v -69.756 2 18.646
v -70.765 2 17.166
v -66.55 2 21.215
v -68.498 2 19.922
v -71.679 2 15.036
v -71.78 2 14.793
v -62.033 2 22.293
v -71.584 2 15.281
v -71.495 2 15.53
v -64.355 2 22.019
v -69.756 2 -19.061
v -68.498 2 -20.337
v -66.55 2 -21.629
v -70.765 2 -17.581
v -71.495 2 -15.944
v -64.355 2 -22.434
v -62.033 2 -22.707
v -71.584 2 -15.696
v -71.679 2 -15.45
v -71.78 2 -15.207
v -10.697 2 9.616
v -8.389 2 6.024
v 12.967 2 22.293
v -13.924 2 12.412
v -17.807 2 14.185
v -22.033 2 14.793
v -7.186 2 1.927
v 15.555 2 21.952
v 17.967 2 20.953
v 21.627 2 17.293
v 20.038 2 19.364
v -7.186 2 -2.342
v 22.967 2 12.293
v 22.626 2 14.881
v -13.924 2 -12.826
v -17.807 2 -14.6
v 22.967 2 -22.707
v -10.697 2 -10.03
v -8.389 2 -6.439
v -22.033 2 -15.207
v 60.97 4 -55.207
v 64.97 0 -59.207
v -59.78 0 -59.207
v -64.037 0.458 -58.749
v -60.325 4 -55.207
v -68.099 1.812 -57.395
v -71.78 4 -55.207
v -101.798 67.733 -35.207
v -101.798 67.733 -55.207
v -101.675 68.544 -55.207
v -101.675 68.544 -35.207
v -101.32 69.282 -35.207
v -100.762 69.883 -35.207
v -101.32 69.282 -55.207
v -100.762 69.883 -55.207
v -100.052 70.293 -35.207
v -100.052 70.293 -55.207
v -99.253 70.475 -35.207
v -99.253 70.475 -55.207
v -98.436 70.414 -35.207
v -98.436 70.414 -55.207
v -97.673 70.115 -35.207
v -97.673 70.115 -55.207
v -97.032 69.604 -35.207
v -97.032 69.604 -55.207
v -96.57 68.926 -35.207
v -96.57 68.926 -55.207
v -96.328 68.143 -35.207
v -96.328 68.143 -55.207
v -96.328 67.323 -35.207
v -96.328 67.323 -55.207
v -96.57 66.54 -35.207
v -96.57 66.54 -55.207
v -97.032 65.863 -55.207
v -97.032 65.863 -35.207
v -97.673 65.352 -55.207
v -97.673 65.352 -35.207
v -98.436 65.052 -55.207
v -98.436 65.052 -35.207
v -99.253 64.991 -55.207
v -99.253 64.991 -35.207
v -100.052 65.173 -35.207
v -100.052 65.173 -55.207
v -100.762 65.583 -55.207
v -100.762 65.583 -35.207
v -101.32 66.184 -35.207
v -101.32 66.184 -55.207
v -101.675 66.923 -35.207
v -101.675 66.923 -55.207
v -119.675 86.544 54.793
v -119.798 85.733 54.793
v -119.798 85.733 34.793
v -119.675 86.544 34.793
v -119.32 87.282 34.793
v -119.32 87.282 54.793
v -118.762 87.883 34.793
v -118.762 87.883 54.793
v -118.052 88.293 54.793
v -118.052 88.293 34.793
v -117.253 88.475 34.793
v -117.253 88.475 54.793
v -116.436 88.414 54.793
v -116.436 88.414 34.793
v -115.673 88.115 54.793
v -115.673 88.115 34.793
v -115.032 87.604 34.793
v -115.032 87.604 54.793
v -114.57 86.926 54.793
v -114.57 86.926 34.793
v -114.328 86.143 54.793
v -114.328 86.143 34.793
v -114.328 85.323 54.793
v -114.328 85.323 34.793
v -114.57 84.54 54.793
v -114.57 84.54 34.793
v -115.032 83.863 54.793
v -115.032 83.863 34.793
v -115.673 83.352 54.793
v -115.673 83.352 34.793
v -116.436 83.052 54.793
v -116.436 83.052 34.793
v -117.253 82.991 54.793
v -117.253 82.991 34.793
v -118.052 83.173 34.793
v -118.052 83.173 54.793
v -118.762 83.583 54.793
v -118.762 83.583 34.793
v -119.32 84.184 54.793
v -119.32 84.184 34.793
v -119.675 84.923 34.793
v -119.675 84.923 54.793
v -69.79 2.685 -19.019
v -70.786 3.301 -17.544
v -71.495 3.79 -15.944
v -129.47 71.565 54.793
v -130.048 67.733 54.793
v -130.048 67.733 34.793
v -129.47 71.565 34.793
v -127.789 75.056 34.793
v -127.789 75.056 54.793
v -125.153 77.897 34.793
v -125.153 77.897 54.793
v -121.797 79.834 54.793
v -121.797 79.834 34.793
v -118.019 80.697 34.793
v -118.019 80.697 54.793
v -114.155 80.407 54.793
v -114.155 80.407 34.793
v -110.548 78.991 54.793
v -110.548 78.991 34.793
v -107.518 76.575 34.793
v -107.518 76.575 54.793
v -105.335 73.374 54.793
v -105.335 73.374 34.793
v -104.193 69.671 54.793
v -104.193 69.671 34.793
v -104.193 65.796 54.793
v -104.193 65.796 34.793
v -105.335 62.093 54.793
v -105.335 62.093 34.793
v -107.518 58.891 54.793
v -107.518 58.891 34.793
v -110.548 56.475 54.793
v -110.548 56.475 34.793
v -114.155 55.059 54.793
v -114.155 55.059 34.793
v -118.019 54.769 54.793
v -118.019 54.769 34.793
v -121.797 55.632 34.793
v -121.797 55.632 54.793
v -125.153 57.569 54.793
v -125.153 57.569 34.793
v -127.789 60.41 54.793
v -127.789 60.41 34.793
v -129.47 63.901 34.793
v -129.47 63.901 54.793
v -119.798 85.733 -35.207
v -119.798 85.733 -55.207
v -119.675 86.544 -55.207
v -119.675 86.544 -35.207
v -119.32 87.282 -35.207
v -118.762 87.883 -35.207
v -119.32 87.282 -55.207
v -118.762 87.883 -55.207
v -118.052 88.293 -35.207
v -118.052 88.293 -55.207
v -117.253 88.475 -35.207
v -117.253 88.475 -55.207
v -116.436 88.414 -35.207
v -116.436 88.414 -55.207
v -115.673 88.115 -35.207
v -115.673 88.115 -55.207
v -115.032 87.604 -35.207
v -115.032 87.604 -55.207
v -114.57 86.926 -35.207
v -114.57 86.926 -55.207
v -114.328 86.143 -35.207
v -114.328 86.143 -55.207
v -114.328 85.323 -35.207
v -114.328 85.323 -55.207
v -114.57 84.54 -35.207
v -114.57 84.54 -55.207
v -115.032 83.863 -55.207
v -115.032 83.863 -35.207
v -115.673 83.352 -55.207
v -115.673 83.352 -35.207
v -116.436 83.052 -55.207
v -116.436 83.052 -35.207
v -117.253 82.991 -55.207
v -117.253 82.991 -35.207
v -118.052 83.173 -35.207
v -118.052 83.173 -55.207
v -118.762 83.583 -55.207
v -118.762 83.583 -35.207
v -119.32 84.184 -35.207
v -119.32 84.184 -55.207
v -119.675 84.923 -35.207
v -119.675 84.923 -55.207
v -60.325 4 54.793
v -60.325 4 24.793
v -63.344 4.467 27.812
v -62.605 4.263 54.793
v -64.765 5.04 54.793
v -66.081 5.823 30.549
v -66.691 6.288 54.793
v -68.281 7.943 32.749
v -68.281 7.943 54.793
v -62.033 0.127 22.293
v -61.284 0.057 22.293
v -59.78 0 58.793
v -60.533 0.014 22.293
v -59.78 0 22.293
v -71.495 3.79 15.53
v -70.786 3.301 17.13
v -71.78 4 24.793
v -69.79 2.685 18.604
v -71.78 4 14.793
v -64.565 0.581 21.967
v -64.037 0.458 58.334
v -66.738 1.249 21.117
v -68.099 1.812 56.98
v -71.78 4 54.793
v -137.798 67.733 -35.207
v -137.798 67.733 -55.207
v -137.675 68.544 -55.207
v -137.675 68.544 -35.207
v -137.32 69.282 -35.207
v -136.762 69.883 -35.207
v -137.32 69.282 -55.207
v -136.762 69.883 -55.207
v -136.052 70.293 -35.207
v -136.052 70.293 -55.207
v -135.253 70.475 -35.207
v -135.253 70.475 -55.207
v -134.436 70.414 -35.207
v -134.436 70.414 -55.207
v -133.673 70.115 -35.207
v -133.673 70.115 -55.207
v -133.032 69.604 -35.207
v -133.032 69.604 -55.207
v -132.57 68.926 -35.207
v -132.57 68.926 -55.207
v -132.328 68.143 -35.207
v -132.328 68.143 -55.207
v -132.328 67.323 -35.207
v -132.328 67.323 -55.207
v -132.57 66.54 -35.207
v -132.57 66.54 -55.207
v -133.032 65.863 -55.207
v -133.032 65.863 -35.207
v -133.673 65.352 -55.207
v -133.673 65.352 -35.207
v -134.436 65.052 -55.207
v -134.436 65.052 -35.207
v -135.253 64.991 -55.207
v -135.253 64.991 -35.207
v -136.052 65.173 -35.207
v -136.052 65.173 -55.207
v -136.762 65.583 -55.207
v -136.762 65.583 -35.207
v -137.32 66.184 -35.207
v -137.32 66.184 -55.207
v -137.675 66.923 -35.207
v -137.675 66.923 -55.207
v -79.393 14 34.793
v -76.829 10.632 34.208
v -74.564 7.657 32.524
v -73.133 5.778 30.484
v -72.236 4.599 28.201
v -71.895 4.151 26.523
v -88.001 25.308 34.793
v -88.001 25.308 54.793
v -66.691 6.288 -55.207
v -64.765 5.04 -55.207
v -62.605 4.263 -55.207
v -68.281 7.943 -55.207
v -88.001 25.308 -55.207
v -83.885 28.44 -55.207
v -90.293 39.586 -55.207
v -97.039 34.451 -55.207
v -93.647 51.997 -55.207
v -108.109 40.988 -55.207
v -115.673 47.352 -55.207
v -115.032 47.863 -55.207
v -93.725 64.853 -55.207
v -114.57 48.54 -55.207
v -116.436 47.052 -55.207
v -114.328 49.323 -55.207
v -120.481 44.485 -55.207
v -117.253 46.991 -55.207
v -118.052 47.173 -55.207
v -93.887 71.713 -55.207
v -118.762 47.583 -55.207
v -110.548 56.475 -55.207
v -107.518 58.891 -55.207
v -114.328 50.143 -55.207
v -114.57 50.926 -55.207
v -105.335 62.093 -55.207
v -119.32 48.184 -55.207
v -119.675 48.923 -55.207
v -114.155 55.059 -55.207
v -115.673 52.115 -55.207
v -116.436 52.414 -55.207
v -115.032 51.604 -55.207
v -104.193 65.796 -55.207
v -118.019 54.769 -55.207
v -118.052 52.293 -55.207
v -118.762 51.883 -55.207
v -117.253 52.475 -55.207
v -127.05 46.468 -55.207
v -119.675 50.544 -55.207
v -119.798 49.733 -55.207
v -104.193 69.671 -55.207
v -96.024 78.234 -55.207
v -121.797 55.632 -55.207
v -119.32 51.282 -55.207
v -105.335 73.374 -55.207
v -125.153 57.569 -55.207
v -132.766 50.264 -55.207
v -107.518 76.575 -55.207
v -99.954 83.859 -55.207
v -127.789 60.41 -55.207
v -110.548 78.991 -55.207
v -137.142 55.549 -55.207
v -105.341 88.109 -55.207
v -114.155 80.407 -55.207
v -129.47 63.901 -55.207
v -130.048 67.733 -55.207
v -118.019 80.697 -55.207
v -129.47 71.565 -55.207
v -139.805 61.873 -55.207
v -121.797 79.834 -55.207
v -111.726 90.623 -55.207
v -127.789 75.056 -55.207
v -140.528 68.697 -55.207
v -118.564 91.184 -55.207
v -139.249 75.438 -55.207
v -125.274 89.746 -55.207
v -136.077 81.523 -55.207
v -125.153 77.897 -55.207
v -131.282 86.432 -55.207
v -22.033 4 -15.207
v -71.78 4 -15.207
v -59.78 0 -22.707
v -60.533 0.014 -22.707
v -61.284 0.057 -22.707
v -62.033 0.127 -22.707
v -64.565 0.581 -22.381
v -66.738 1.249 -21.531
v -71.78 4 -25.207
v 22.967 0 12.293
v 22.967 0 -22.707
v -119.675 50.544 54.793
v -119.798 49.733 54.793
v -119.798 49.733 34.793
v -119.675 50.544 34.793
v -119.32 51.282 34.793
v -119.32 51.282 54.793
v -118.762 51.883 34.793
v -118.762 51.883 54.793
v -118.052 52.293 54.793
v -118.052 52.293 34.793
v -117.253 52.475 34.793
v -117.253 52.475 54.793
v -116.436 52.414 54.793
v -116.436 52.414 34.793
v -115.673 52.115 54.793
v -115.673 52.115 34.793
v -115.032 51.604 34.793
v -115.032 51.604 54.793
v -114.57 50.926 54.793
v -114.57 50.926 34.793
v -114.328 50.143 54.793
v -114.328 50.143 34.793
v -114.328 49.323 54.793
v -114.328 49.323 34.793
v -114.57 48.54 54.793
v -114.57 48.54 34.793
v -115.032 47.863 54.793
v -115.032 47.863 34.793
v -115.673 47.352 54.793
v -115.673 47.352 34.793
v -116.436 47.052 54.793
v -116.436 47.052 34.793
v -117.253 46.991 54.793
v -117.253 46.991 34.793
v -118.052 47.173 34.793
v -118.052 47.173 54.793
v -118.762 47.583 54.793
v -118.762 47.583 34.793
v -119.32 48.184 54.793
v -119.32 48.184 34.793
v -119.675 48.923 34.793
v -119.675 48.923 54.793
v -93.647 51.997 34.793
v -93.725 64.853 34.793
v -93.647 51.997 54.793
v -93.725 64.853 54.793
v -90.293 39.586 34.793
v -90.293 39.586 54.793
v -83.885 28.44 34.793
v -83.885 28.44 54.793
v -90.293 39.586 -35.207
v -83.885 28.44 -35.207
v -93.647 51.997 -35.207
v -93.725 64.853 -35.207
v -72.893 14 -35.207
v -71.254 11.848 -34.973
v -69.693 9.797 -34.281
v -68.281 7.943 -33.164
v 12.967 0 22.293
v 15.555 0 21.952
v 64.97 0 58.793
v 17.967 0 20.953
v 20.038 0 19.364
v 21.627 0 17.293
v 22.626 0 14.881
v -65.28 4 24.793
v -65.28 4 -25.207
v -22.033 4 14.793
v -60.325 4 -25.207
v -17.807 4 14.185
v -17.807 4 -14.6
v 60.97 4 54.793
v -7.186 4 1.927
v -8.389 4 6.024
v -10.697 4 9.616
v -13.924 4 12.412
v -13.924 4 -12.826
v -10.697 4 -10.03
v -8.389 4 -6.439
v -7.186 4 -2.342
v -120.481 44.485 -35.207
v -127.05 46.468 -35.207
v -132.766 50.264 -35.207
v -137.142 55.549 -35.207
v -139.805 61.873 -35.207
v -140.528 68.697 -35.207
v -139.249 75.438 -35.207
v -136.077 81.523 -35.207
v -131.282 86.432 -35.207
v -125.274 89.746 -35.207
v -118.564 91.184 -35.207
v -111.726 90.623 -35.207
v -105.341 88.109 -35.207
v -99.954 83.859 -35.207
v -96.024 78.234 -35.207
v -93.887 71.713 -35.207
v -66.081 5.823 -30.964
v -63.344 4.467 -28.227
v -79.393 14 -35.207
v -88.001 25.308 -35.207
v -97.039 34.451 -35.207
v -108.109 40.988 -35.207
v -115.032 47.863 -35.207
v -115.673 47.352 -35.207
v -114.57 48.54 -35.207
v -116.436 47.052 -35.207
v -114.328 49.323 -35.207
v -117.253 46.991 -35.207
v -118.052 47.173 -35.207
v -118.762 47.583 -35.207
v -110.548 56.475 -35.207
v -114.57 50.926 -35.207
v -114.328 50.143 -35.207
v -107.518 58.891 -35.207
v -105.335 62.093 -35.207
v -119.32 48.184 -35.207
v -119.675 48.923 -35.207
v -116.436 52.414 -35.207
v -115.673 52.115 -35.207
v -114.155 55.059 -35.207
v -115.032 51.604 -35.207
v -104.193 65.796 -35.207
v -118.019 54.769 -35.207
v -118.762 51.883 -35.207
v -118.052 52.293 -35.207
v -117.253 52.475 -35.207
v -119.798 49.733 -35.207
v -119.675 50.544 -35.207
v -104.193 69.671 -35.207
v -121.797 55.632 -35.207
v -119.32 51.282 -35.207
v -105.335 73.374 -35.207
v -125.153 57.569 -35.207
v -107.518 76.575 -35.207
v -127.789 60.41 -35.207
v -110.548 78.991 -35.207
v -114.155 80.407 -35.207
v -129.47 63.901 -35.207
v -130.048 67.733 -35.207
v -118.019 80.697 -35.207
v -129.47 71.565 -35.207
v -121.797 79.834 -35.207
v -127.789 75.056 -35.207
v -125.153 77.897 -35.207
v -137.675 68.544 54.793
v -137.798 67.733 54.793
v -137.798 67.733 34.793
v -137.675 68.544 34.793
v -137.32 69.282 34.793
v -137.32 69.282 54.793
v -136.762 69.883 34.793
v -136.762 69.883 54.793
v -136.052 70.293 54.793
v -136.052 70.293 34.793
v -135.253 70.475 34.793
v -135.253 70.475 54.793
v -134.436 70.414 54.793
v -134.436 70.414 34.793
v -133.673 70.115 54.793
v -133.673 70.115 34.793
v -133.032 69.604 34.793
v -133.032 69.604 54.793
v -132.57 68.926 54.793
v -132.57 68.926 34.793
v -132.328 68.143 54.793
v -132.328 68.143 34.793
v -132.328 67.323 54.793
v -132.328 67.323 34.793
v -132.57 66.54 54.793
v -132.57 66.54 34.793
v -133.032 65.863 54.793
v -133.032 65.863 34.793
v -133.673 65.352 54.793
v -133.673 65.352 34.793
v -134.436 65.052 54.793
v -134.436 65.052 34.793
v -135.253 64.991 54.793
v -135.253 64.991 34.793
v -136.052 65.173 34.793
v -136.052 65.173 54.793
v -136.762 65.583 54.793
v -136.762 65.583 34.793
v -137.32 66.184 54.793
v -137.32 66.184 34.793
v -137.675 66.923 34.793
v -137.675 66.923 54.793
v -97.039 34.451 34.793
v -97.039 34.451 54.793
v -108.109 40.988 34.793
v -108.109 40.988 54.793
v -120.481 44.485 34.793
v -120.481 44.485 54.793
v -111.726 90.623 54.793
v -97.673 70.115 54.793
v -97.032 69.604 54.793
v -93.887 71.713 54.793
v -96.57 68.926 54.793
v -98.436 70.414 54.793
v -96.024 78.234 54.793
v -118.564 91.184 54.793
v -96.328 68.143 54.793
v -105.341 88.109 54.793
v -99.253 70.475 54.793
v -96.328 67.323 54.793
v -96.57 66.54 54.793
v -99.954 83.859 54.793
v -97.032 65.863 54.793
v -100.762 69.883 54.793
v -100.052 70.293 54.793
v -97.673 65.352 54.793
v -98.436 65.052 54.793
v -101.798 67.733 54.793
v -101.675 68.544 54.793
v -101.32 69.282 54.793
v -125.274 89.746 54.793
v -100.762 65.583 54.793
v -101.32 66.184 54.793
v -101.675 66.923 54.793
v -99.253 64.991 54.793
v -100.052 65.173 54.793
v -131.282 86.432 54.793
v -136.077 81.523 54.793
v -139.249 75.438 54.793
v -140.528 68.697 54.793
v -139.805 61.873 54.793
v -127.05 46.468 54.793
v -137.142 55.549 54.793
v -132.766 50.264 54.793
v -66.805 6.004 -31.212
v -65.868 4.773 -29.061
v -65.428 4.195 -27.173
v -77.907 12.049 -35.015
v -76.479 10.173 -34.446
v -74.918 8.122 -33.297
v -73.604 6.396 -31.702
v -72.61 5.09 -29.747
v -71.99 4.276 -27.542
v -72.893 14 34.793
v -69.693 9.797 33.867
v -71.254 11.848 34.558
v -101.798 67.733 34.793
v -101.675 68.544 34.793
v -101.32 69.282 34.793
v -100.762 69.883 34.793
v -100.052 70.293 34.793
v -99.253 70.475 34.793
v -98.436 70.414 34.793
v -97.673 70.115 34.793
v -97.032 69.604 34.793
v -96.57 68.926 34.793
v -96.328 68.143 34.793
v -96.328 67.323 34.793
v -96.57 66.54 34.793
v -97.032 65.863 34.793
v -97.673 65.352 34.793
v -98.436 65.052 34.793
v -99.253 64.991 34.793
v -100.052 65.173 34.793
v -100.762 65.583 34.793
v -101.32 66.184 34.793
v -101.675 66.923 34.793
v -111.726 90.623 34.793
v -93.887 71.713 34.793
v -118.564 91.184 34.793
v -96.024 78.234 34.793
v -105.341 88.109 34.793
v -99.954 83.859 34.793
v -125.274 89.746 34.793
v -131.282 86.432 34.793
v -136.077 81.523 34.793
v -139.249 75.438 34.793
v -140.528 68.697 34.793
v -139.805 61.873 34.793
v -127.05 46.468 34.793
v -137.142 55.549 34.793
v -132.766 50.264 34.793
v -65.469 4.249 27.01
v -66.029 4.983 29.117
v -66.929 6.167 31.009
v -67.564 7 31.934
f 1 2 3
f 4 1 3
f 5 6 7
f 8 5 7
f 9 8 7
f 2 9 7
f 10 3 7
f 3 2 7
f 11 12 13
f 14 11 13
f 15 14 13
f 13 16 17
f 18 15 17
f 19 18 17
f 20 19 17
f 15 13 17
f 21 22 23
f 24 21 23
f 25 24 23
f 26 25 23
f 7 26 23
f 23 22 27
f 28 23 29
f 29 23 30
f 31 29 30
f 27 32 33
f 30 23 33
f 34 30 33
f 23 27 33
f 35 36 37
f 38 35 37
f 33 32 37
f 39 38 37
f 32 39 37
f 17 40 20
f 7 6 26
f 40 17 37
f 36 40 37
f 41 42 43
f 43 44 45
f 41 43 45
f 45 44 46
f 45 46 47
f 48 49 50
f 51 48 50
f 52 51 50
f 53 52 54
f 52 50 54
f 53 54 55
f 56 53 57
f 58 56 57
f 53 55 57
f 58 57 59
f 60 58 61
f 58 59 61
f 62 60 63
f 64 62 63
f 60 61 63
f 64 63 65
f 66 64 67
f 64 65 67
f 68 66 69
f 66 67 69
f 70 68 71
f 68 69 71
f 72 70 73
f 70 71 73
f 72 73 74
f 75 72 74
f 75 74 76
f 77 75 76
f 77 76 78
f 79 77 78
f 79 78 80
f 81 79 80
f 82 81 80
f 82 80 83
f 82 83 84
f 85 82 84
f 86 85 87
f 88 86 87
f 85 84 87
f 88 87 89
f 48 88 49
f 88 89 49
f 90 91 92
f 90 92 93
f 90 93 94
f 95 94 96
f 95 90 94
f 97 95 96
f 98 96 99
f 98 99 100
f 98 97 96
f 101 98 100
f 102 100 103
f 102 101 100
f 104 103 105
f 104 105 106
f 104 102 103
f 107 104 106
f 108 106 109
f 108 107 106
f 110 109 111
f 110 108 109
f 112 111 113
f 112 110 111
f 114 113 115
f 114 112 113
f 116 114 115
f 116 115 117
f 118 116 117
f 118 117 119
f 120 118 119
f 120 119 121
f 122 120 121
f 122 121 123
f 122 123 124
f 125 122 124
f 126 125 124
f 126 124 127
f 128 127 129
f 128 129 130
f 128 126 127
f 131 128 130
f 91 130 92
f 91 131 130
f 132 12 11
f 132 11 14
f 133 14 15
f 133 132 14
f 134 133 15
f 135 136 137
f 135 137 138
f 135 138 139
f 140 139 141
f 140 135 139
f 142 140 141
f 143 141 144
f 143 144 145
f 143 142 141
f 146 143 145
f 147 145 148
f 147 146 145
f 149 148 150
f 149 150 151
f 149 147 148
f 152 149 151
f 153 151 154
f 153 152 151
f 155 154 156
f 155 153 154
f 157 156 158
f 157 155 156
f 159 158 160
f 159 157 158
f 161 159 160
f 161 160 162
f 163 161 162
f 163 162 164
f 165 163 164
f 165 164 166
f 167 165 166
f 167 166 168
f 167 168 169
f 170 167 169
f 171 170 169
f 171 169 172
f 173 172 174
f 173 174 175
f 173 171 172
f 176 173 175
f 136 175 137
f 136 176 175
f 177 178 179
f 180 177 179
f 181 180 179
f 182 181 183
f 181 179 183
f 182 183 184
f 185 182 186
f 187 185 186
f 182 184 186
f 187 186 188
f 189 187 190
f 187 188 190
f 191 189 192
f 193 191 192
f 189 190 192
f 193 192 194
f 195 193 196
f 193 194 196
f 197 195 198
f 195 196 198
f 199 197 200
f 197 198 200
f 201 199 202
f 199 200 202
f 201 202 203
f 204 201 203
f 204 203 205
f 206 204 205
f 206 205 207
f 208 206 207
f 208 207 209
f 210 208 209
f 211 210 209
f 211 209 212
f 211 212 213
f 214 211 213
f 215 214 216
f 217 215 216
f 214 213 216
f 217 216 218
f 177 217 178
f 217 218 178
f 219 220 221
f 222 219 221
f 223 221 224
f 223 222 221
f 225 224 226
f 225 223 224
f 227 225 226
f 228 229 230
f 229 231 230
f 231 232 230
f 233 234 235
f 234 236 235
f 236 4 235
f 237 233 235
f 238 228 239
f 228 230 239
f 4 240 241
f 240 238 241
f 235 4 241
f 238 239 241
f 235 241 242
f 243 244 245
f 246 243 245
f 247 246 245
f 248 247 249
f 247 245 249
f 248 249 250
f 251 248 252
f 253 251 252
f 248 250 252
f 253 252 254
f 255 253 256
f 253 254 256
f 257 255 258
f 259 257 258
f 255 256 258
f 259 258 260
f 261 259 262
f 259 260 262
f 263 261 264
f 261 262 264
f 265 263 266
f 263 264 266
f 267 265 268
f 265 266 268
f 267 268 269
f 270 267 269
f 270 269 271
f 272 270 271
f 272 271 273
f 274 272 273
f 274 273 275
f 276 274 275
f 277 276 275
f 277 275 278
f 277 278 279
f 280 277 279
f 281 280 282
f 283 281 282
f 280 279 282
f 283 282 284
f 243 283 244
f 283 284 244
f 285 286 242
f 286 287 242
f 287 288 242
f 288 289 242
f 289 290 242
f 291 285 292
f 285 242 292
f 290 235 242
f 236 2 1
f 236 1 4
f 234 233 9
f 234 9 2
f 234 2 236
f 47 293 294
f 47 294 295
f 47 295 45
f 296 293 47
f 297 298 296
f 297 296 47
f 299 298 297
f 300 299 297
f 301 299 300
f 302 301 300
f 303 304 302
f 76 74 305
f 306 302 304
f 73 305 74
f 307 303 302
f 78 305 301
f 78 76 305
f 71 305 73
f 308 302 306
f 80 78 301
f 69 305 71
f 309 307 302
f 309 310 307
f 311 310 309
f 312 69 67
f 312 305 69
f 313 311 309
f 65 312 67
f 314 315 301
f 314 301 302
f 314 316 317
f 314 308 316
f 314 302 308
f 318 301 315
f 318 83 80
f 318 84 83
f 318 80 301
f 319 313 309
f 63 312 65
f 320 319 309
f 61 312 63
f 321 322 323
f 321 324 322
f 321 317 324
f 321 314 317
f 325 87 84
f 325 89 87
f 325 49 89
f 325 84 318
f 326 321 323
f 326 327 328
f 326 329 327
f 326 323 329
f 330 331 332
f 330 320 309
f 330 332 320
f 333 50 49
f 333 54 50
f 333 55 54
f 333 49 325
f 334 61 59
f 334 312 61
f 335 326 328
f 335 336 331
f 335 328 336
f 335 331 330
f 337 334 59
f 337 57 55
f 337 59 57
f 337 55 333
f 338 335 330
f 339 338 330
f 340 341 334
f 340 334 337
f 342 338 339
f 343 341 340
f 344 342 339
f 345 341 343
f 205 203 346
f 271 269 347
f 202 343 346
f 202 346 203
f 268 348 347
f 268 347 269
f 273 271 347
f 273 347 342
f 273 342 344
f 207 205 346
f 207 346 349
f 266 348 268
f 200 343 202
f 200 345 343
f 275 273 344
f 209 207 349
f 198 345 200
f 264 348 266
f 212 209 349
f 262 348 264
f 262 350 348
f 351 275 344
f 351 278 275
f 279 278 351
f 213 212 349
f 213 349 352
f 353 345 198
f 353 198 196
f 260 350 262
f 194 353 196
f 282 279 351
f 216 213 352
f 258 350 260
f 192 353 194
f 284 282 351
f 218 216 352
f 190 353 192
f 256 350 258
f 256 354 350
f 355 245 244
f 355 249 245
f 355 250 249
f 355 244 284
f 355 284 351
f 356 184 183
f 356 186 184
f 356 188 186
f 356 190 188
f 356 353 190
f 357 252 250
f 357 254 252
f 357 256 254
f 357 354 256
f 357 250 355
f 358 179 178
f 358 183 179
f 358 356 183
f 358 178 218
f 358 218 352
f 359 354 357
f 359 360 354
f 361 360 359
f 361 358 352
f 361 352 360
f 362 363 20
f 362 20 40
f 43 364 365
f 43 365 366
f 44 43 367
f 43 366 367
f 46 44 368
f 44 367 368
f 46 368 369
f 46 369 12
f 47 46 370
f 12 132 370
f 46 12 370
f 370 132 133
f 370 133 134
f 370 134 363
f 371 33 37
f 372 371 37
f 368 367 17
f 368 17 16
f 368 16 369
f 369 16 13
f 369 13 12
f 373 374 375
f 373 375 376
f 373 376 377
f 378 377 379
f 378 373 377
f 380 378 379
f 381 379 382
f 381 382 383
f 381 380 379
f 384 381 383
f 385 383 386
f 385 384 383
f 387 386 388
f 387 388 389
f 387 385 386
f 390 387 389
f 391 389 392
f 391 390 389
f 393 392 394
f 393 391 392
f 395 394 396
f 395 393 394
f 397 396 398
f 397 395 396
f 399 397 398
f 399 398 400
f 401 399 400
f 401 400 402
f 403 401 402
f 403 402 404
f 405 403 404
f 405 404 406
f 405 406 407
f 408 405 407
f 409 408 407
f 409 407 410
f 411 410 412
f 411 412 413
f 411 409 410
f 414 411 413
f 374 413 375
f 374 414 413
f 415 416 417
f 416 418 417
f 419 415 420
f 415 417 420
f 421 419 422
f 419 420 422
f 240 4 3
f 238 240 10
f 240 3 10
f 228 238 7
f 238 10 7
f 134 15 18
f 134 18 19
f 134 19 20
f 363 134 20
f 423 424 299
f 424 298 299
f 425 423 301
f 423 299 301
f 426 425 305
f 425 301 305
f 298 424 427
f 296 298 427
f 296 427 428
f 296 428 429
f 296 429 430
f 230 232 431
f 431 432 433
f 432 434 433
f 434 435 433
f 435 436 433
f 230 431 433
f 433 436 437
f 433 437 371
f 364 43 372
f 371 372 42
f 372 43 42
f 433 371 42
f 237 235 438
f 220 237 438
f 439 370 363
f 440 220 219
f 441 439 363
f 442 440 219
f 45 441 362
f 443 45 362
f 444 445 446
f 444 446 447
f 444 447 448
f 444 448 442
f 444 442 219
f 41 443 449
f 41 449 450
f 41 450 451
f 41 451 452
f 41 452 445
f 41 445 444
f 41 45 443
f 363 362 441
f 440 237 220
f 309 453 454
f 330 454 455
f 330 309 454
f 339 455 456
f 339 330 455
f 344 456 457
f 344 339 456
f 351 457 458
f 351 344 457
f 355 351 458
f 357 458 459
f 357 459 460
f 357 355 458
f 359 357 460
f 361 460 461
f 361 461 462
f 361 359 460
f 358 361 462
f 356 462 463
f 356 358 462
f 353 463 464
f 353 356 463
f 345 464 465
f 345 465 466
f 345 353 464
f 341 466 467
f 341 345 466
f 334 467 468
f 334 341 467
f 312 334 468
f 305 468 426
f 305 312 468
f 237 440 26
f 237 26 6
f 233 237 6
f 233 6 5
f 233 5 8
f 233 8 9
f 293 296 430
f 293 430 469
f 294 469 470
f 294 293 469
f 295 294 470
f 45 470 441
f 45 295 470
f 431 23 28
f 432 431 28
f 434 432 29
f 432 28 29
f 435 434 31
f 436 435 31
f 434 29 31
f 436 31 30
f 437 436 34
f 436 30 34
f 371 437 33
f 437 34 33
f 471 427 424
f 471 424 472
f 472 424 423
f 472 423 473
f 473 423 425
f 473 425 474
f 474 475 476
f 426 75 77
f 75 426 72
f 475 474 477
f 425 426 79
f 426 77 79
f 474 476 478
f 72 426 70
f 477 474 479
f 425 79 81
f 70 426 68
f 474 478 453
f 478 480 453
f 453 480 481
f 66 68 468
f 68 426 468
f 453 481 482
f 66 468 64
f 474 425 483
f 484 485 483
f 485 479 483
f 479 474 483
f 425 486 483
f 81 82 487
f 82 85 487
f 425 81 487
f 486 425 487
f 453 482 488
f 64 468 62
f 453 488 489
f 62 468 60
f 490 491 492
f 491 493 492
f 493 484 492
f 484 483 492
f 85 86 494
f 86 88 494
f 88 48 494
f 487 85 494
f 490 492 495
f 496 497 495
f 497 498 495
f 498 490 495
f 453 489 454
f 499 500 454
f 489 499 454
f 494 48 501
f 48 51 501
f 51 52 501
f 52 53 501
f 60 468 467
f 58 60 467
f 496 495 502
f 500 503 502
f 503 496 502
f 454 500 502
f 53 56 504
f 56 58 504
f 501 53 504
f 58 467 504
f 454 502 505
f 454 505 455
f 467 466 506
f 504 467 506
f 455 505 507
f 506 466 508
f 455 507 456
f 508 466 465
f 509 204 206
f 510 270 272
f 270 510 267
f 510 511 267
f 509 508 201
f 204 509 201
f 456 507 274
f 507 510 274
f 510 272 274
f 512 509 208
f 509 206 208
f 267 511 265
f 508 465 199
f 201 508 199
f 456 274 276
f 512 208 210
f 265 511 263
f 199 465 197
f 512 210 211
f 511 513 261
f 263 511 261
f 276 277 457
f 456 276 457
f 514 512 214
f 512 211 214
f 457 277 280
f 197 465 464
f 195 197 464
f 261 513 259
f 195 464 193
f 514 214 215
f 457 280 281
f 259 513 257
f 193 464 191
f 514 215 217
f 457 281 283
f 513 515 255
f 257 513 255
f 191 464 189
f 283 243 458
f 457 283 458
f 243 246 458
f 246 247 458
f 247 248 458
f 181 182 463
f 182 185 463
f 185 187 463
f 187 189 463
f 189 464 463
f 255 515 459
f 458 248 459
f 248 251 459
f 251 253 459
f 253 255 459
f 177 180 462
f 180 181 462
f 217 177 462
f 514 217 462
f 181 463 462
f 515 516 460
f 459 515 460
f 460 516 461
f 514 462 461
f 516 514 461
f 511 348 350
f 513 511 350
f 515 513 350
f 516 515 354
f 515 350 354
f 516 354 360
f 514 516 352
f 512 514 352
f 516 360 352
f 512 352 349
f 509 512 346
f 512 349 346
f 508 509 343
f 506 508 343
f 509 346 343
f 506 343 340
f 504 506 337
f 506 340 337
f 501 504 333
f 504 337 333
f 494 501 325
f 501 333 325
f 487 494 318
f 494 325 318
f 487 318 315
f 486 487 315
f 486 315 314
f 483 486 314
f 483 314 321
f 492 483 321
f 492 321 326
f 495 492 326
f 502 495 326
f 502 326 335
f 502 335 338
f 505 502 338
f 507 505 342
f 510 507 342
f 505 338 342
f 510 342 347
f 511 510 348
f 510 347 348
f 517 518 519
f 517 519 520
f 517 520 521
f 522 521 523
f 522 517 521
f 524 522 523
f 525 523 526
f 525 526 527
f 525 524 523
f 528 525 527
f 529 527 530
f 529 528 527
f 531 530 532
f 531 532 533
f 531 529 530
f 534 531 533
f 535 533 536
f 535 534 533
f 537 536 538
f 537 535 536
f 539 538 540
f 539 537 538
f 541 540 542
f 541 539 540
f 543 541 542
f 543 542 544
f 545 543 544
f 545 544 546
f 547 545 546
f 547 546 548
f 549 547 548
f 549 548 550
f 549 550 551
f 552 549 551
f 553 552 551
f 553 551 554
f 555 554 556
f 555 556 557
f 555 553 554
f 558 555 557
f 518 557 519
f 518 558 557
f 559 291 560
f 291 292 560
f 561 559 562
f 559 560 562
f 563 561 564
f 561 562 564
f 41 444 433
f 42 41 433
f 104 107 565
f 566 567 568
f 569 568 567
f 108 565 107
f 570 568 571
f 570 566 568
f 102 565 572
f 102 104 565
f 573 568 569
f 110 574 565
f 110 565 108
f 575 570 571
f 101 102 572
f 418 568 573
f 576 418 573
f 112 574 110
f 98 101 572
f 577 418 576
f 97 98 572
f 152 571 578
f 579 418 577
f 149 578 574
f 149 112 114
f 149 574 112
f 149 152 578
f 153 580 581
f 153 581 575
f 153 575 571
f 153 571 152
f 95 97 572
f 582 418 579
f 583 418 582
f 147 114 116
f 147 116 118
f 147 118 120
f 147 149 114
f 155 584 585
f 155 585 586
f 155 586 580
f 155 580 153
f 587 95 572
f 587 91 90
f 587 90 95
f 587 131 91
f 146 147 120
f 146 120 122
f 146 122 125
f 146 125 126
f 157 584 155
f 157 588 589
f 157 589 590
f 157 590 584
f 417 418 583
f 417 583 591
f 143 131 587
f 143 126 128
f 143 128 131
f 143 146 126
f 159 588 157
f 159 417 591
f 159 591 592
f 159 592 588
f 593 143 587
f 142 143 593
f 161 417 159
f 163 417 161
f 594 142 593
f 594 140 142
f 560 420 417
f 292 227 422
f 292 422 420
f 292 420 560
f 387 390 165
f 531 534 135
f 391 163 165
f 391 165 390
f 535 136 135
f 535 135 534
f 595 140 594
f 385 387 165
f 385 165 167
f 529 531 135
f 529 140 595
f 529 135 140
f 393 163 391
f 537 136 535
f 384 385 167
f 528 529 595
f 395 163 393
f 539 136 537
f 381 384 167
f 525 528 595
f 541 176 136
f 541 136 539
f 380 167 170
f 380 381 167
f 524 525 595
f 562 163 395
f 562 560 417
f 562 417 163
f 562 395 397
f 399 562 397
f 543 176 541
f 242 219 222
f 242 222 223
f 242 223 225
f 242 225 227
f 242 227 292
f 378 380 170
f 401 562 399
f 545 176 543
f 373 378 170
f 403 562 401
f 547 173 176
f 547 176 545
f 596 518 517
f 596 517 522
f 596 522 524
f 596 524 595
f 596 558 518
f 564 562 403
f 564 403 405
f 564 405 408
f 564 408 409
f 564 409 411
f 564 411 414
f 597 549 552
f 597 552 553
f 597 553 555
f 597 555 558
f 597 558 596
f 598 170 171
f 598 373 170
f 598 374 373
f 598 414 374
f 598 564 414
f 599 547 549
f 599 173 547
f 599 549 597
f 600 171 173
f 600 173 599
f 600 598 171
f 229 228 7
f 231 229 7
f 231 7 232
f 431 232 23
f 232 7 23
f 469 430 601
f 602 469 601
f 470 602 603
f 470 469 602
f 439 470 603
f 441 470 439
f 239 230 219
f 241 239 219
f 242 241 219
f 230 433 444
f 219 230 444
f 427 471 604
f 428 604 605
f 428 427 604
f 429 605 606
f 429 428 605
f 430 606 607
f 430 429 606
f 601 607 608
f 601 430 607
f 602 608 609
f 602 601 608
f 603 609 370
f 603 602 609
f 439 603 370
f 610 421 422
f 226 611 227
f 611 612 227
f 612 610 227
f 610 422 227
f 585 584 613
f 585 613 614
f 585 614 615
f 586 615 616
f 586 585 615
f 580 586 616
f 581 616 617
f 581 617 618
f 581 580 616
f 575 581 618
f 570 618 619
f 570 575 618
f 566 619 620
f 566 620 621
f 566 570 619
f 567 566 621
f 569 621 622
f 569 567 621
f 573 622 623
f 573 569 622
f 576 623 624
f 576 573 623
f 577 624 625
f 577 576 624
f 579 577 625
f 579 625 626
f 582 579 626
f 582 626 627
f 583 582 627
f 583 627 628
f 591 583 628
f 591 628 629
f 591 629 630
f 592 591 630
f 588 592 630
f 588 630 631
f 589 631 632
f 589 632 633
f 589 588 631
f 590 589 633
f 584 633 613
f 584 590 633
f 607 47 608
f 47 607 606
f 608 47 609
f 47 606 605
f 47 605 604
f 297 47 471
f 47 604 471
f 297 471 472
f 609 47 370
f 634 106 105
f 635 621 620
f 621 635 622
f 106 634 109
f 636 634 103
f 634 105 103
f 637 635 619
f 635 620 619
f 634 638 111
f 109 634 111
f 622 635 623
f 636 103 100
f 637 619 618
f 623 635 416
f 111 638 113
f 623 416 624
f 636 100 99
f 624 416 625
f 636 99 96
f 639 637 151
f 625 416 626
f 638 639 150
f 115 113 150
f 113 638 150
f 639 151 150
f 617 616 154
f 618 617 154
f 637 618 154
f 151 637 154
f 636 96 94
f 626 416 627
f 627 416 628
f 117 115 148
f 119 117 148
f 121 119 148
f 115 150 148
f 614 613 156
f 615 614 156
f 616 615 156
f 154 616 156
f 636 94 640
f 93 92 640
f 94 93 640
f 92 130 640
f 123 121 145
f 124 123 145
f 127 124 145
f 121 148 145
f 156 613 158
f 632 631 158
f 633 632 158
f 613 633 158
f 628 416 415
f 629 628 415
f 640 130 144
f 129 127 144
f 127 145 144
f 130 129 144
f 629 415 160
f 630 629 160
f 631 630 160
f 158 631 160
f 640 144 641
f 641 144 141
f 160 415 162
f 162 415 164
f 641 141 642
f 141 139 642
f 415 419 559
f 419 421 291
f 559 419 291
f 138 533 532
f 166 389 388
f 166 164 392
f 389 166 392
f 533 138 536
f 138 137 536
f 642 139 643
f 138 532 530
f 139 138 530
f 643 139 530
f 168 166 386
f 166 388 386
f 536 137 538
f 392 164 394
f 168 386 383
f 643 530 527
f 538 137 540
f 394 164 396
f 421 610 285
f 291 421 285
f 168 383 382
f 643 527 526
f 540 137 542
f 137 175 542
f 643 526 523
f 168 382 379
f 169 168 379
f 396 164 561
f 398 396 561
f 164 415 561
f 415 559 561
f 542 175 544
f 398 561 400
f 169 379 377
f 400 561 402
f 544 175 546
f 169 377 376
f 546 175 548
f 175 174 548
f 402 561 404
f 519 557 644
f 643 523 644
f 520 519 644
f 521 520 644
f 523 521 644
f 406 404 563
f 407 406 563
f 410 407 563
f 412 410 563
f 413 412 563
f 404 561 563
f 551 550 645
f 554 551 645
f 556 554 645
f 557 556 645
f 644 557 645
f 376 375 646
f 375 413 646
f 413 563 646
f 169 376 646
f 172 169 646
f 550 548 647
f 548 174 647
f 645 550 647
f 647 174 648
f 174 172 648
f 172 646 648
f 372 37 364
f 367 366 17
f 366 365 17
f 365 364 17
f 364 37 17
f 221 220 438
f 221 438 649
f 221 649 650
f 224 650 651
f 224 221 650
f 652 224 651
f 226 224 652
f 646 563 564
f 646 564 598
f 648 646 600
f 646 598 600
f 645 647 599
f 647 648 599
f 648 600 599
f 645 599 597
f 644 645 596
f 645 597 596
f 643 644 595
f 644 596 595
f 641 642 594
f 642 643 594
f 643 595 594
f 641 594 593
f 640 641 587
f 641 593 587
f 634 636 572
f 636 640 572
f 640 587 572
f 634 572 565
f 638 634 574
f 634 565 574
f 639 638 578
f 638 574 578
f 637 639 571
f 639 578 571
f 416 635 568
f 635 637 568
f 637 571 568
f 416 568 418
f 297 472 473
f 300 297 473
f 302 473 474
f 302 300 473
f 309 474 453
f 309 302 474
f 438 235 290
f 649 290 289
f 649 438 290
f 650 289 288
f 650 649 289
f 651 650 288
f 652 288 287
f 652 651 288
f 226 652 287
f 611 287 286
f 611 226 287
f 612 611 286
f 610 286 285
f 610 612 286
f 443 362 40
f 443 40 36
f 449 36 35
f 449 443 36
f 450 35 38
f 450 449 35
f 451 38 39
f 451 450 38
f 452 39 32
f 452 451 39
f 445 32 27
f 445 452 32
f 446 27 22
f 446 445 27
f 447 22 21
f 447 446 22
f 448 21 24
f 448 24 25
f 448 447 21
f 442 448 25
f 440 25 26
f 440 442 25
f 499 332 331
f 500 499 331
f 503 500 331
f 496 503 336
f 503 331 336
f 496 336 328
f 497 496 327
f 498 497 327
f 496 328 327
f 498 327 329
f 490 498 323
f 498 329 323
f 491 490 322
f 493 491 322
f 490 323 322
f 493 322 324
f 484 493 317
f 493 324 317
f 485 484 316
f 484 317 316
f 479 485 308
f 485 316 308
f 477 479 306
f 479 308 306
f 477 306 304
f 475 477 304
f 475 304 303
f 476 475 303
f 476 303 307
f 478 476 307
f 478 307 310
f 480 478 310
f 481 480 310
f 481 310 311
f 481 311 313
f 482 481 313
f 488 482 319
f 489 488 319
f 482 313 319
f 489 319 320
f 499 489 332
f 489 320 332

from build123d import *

# Parameters (mm, degrees)
SKETCH1_W           = 142.75
SKETCH1_H           = 130
BOSS_EXTRUDE1_DEPTH = 4
CHAMFER4_SIZE       = 10
CHAMFER5_SIZE       = 10
SKETCH11_R          = 23.5
SKETCH11_R_2        = 2.75
SKETCH11_R_3        = 13
BOSS_EXTRUDE3_DEPTH = 20
CUT_EXTRUDE3_REACH  = 177.695
FILLET5_R           = 20
FILLET8_R           = 10
FILLET9_R           = 50
BOSS_EXTRUDE5_DEPTH = 2


with BuildPart() as part:
    # Sketch1 → Boss-Extrude1 (new body)
    with BuildSketch(Plane(origin=(0, 0, 0), x_dir=(1, 0, 0), z_dir=(0, 1, 0))):
        with Locations((-0.404975067, 0.207290513)):
            Rectangle(SKETCH1_W, SKETCH1_H)
    extrude(amount=BOSS_EXTRUDE1_DEPTH)

    # Chamfer4
    # the kernel refuses this chamfer: 10 mm, written as the material it takes off along each edge
    with BuildSketch(Plane(origin=(-97.496804946, 4, -65.207290513), x_dir=(0, -1, 0), z_dir=(1, 0, 0)), Plane(origin=(96.686854813, 4, 64.792709487), x_dir=(0, -1, 0), z_dir=(-1, 0, 0))) as chamfer4_piece_1:
        Polygon((CHAMFER4_SIZE, 0), (0, -CHAMFER4_SIZE), (0, 0), align=None)
    extrude(amount=194.183659759, mode=Mode.SUBTRACT)

    # Chamfer5
    # the kernel refuses this chamfer: 10 mm, written as the material it takes off along each edge
    with BuildSketch(Plane(origin=(70.970024933, 4, -80.924120393), x_dir=(-1, 0, 0), z_dir=(0, 0, 1))) as chamfer5_piece_1:
        Polygon((CHAMFER5_SIZE, 0), (0, CHAMFER5_SIZE), (0, 0), align=None)
    extrude(amount=161.433659759, mode=Mode.SUBTRACT)

    # Sketch11 → Boss-Extrude3 (add)
    # profile 1 of 2: a face of its own
    with BuildSketch(Plane(origin=(0, 0, 54.792709487), x_dir=(-1, 0, 0), z_dir=(0, 0, -1))):
        with Locations((117.047641156, 67.733126253)):
            Circle(SKETCH11_R)
        with Locations((99.047641156, 67.733126253)):
            Circle(SKETCH11_R_2, mode=Mode.SUBTRACT)
        with Locations((117.047641156, 85.733126253)):
            Circle(SKETCH11_R_2, mode=Mode.SUBTRACT)
        with Locations((135.047641156, 67.733126253)):
            Circle(SKETCH11_R_2, mode=Mode.SUBTRACT)
        with Locations((117.047641156, 49.733126253)):
            Circle(SKETCH11_R_2, mode=Mode.SUBTRACT)
        with Locations((117.047641156, 67.733126253)):
            Circle(SKETCH11_R_3, mode=Mode.SUBTRACT)
    # profile 2 of 2: a face of its own
    with BuildSketch(Plane(origin=(0, 0, 54.792709487), x_dir=(-1, 0, 0), z_dir=(0, 0, -1))):
        Polygon((65.279975067, 4), (71.779975067, 4), (110.625146065, 55.02727289), (106.509975067, 58.16), align=None)
    boss_extrude3 = extrude(amount=BOSS_EXTRUDE3_DEPTH)

    # Sketch12 → Cut-Extrude3 (cut, up to next)
    with BuildSketch(Plane(origin=(0, 4, 0), x_dir=(1, 0, 0), z_dir=(0, 1, 0)), mode=Mode.PRIVATE) as cut_extrude3_sk1:
        with BuildLine():
            Line((-62.033374936, -22.292709487), (12.966625064, -22.292709487))
            ThreePointArc((12.966625064, -22.292709487), (20.037692876, -19.363777299), (22.966625064, -12.292709487))
            Line((22.966625064, -12.292709487), (22.966625064, 22.707290513))
            Line((22.966625064, 22.707290513), (-62.033374936, 22.707290513))
            ThreePointArc((-62.033374936, 22.707290513), (-67.848507835, 20.84265955), (-71.495025362, 15.944136388))
            ThreePointArc((-71.495025362, 15.944136388), (-71.630244869, 15.572907696), (-71.779975067, 15.207290513))
            Line((-71.779975067, 15.207290513), (-71.779975067, -14.792709487))
            ThreePointArc((-71.779975067, -14.792709487), (-71.630247327, -15.158320315), (-71.495029773, -15.529542467))
            ThreePointArc((-71.495029773, -15.529542467), (-67.848513378, -20.428074562), (-62.033374936, -22.292709487))
        make_face()
    cut_extrude3_tool1 = extrude(cut_extrude3_sk1.sketch, amount=-CUT_EXTRUDE3_REACH, mode=Mode.PRIVATE) & part.part
    add(cut_extrude3_tool1.solids().sort_by_distance((-24.222891, 4, -0.310755))[0], mode=Mode.SUBTRACT)

    # Fillet5
    # the kernel refuses this fillet: 20 mm, written as the material it takes off along each edge
    with BuildSketch(Plane(origin=(-71.779975067, 0, 14.792709487), x_dir=(1, 0, 0), z_dir=(0, 0, -1))) as fillet5_piece_1:
        with BuildLine():
            CenterArc((12, -20), FILLET5_R, 90, 36.869897646)
            Line((0, -4), (-0.24, -3.68))
            ThreePointArc((-0.24, -3.68), (-0.4, -2), (-0.4, 0))
            Line((-0.4, 0), (0, 0.4))
            Line((0, 0.4), (12, 0.4))
            Line((12, 0.4), (12, 0))
        make_face()
    extrude(amount=104, mode=Mode.SUBTRACT)
    with BuildSketch(Plane(origin=(-71.779975067, 0, 88.792709487), x_dir=(0, 1, 0), z_dir=(0, 0, -1))) as fillet5_piece_2:
        with BuildLine():
            CenterArc((20, 12), FILLET5_R, 180, 36.869897646)
            Line((0, 12), (-0.4, 12))
            Line((-0.4, 12), (-0.4, 0))
            Line((-0.4, 0), (0, -0.4))
            ThreePointArc((0, -0.4), (2, -0.4), (3.68, -0.24))
            Line((3.68, -0.24), (4, 0))
        make_face()
    extrude(amount=104, mode=Mode.SUBTRACT)

    # Mirror3: Boss-Extrude3 across plane
    add(boss_extrude3.mirror(Plane.XY.offset(-0.207290513)))

    # Fillet8
    # the kernel refuses this fillet: 10 mm, written as the material it adds along each edge
    with BuildSketch(Plane(origin=(-40.279975067, 4, -35.207290513), x_dir=(0, 0, 1), z_dir=(-1, 0, 0))) as fillet8_piece_1_section:
        with BuildLine():
            CenterArc((FILLET8_R, FILLET8_R), FILLET8_R, 180, 90)
            Line((0, FILLET8_R), (0, 0))
            Line((0, 0), (FILLET8_R, 0))
        make_face()
    fillet8_piece_1 = extrude(amount=56.5, mode=Mode.PRIVATE)
    fillet8_piece_1 = split(fillet8_piece_1, bisect_by=Plane(origin=(-56.107555829, -8.048950422, -35.207290513), z_dir=(-0.7956778434191335, -0.6057200421744992, 0)), keep=Keep.TOP, mode=Mode.PRIVATE)
    fillet8_piece_1 = split(fillet8_piece_1, bisect_by=Plane(origin=(-60.222726828, -11.181677532, -35.207290513), z_dir=(0.7956778434191335, 0.605720042174499, 0)), keep=Keep.TOP, mode=Mode.PRIVATE)
    add(fillet8_piece_1)
    with BuildSketch(Plane(origin=(-65.279975067, 4, -55.207290513), x_dir=(1, 0, 0), z_dir=(0, 0, 1))) as fillet8_piece_2:
        with BuildLine():
            CenterArc((FILLET8_R * 0.495527129587, FILLET8_R), FILLET8_R, 217.280673383, 52.719326617)
            Line((-FILLET8_R * 0.300150713832, FILLET8_R * 0.394279957825), (0, 0))
            Line((0, 0), (FILLET8_R * 0.495527129587, 0))
        make_face()
    extrude(amount=20)
    with BuildSketch(Plane(origin=(-65.279975067, 4, 54.792709487), x_dir=(1, 0, 0), z_dir=(0, 0, -1))) as fillet8_piece_3:
        with BuildLine():
            CenterArc((FILLET8_R * 0.495527129587, -FILLET8_R), FILLET8_R, 90, 52.719326617)
            Line((-FILLET8_R * 0.300150713832, -FILLET8_R * 0.394279957825), (0, 0))
            Line((0, 0), (FILLET8_R * 0.495527129587, 0))
        make_face()
    extrude(amount=20)
    with BuildSketch(Plane(origin=(-40.279975067, 4, 34.792709487), x_dir=(0, 0, -1), z_dir=(-1, 0, 0))) as fillet8_piece_4_section:
        with BuildLine():
            CenterArc((FILLET8_R, -FILLET8_R), FILLET8_R, 90, 90)
            Line((0, -FILLET8_R), (0, 0))
            Line((0, 0), (FILLET8_R, 0))
        make_face()
    fillet8_piece_4 = extrude(amount=56.5, mode=Mode.PRIVATE)
    fillet8_piece_4 = split(fillet8_piece_4, bisect_by=Plane(origin=(-56.107555829, -8.048950422, 34.792709487), z_dir=(-0.7956778434191335, -0.6057200421744992, 0)), keep=Keep.TOP, mode=Mode.PRIVATE)
    fillet8_piece_4 = split(fillet8_piece_4, bisect_by=Plane(origin=(-60.222726828, -11.181677532, 34.792709487), z_dir=(0.7956778434191335, 0.605720042174499, 0)), keep=Keep.TOP, mode=Mode.PRIVATE)
    add(fillet8_piece_4)
    with BuildSketch(Plane(origin=(-65.279975067, 4, -55.207290513), x_dir=(1, 0, 0), z_dir=(0, 0, 1))) as fillet8_piece_5a_section:
        with BuildLine():
            CenterArc((FILLET8_R * 0.495527129587, FILLET8_R), FILLET8_R, 217.280673383, 52.719326617)
            Line((-FILLET8_R * 0.300150713832, FILLET8_R * 0.394279957825), (0, 0))
            Line((0, 0), (FILLET8_R * 0.495527129587, 0))
        make_face()
    fillet8_piece_5a = extrude(amount=32.38817824, mode=Mode.PRIVATE)
    fillet8_piece_5a = split(fillet8_piece_5a, bisect_by=Plane(origin=(-65.279975067, 4, -35.207290513), z_dir=(0, 0, 1)), keep=Keep.TOP, mode=Mode.PRIVATE)
    with BuildSketch(Plane(origin=(-40.279975067, 4, -35.207290513), x_dir=(0, 0, 1), z_dir=(-1, 0, 0))) as fillet8_piece_5b_section:
        with BuildLine():
            CenterArc((FILLET8_R, FILLET8_R), FILLET8_R, 180, 90)
            Line((0, FILLET8_R), (0, 0))
            Line((0, 0), (FILLET8_R, 0))
        make_face()
    fillet8_piece_5b = extrude(amount=56.5, mode=Mode.PRIVATE)
    fillet8_piece_5b = split(fillet8_piece_5b, bisect_by=Plane(origin=(-56.107555829, -8.048950422, -35.207290513), z_dir=(0.7956778434191335, 0.6057200421744992, 0)), keep=Keep.TOP, mode=Mode.PRIVATE)
    fillet8_piece_5b = fillet8_piece_5b & Plane(origin=(-59.779975067, 20, -35.207290513), x_dir=(1, 0, 0), z_dir=(0, 0, 1)) * Cylinder(20, 154, mode=Mode.PRIVATE)
    fillet8_piece_5 = fillet8_piece_5a & fillet8_piece_5b
    add(fillet8_piece_5)
    with BuildSketch(Plane(origin=(-40.279975067, 4, 34.792709487), x_dir=(0, 0, -1), z_dir=(-1, 0, 0))) as fillet8_piece_6a_section:
        with BuildLine():
            CenterArc((FILLET8_R, -FILLET8_R), FILLET8_R, 90, 90)
            Line((0, -FILLET8_R), (0, 0))
            Line((0, 0), (FILLET8_R, 0))
        make_face()
    fillet8_piece_6a = extrude(amount=56.5, mode=Mode.PRIVATE)
    fillet8_piece_6a = fillet8_piece_6a & Plane(origin=(-59.779975067, 20, 34.792709487), x_dir=(0, 1, 0), z_dir=(0, 0, 1)) * Cylinder(20, 154, mode=Mode.PRIVATE)
    fillet8_piece_6a = split(fillet8_piece_6a, bisect_by=Plane(origin=(-56.107555829, -8.048950422, 34.792709487), z_dir=(0.7956778434191335, 0.6057200421744992, 0)), keep=Keep.TOP, mode=Mode.PRIVATE)
    with BuildSketch(Plane(origin=(-65.279975067, 4, 54.792709487), x_dir=(1, 0, 0), z_dir=(0, 0, -1))) as fillet8_piece_6b_section:
        with BuildLine():
            CenterArc((FILLET8_R * 0.495527129587, -FILLET8_R), FILLET8_R, 90, 52.719326617)
            Line((-FILLET8_R * 0.300150713832, -FILLET8_R * 0.394279957825), (0, 0))
            Line((0, 0), (FILLET8_R * 0.495527129587, 0))
        make_face()
    fillet8_piece_6b = extrude(amount=32.38817824, mode=Mode.PRIVATE)
    fillet8_piece_6b = split(fillet8_piece_6b, bisect_by=Plane(origin=(-65.279975067, 4, 34.792709487), z_dir=(0, 0, -1)), keep=Keep.TOP, mode=Mode.PRIVATE)
    fillet8_piece_6 = fillet8_piece_6a & fillet8_piece_6b
    add(fillet8_piece_6)

    # Fillet9
    fillet9_edges = [part.edges().sort_by_distance(p)[0] for p in [
        (-104.957249904, 47.581887101, -45.207290513),
        (-100.842078905, 50.714614211, -45.207290513),
        (-104.957249904, 47.581887101, 44.792709487),
        (-100.842078905, 50.714614211, 44.792709487),
    ]]
    fillet(fillet9_edges, radius=FILLET9_R)

    # Sketch14 → Boss-Extrude5 (add)
    with BuildSketch(Plane(origin=(0, 4, 0), x_dir=(1, 0, 0), z_dir=(0, 1, 0))):
        with BuildLine():
            Line((-71.779975067, 15.207290513), (-22.033374936, 15.207290513))
            ThreePointArc((-22.033374936, 15.207290513), (-7.033374936, 0.207290513), (-22.033374936, -14.792709487))
            Line((-22.033374936, -14.792709487), (-71.779975067, -14.792709487))
            ThreePointArc((-71.779975067, -14.792709487), (-71.630247327, -15.158320315), (-71.495029773, -15.529542467))
            ThreePointArc((-71.495029773, -15.529542467), (-67.848513378, -20.428074562), (-62.033374936, -22.292709487))
            Line((-62.033374936, -22.292709487), (12.966625064, -22.292709487))
            ThreePointArc((12.966625064, -22.292709487), (20.037692876, -19.363777299), (22.966625064, -12.292709487))
            Line((22.966625064, -12.292709487), (22.966625064, 22.707290513))
            Line((22.966625064, 22.707290513), (-62.033374936, 22.707290513))
            ThreePointArc((-62.033374936, 22.707290513), (-67.848507835, 20.84265955), (-71.495025362, 15.944136388))
            ThreePointArc((-71.495025362, 15.944136388), (-71.630244869, 15.572907696), (-71.779975067, 15.207290513))
        make_face()
    extrude(amount=-BOSS_EXTRUDE5_DEPTH)


solid = part.part
